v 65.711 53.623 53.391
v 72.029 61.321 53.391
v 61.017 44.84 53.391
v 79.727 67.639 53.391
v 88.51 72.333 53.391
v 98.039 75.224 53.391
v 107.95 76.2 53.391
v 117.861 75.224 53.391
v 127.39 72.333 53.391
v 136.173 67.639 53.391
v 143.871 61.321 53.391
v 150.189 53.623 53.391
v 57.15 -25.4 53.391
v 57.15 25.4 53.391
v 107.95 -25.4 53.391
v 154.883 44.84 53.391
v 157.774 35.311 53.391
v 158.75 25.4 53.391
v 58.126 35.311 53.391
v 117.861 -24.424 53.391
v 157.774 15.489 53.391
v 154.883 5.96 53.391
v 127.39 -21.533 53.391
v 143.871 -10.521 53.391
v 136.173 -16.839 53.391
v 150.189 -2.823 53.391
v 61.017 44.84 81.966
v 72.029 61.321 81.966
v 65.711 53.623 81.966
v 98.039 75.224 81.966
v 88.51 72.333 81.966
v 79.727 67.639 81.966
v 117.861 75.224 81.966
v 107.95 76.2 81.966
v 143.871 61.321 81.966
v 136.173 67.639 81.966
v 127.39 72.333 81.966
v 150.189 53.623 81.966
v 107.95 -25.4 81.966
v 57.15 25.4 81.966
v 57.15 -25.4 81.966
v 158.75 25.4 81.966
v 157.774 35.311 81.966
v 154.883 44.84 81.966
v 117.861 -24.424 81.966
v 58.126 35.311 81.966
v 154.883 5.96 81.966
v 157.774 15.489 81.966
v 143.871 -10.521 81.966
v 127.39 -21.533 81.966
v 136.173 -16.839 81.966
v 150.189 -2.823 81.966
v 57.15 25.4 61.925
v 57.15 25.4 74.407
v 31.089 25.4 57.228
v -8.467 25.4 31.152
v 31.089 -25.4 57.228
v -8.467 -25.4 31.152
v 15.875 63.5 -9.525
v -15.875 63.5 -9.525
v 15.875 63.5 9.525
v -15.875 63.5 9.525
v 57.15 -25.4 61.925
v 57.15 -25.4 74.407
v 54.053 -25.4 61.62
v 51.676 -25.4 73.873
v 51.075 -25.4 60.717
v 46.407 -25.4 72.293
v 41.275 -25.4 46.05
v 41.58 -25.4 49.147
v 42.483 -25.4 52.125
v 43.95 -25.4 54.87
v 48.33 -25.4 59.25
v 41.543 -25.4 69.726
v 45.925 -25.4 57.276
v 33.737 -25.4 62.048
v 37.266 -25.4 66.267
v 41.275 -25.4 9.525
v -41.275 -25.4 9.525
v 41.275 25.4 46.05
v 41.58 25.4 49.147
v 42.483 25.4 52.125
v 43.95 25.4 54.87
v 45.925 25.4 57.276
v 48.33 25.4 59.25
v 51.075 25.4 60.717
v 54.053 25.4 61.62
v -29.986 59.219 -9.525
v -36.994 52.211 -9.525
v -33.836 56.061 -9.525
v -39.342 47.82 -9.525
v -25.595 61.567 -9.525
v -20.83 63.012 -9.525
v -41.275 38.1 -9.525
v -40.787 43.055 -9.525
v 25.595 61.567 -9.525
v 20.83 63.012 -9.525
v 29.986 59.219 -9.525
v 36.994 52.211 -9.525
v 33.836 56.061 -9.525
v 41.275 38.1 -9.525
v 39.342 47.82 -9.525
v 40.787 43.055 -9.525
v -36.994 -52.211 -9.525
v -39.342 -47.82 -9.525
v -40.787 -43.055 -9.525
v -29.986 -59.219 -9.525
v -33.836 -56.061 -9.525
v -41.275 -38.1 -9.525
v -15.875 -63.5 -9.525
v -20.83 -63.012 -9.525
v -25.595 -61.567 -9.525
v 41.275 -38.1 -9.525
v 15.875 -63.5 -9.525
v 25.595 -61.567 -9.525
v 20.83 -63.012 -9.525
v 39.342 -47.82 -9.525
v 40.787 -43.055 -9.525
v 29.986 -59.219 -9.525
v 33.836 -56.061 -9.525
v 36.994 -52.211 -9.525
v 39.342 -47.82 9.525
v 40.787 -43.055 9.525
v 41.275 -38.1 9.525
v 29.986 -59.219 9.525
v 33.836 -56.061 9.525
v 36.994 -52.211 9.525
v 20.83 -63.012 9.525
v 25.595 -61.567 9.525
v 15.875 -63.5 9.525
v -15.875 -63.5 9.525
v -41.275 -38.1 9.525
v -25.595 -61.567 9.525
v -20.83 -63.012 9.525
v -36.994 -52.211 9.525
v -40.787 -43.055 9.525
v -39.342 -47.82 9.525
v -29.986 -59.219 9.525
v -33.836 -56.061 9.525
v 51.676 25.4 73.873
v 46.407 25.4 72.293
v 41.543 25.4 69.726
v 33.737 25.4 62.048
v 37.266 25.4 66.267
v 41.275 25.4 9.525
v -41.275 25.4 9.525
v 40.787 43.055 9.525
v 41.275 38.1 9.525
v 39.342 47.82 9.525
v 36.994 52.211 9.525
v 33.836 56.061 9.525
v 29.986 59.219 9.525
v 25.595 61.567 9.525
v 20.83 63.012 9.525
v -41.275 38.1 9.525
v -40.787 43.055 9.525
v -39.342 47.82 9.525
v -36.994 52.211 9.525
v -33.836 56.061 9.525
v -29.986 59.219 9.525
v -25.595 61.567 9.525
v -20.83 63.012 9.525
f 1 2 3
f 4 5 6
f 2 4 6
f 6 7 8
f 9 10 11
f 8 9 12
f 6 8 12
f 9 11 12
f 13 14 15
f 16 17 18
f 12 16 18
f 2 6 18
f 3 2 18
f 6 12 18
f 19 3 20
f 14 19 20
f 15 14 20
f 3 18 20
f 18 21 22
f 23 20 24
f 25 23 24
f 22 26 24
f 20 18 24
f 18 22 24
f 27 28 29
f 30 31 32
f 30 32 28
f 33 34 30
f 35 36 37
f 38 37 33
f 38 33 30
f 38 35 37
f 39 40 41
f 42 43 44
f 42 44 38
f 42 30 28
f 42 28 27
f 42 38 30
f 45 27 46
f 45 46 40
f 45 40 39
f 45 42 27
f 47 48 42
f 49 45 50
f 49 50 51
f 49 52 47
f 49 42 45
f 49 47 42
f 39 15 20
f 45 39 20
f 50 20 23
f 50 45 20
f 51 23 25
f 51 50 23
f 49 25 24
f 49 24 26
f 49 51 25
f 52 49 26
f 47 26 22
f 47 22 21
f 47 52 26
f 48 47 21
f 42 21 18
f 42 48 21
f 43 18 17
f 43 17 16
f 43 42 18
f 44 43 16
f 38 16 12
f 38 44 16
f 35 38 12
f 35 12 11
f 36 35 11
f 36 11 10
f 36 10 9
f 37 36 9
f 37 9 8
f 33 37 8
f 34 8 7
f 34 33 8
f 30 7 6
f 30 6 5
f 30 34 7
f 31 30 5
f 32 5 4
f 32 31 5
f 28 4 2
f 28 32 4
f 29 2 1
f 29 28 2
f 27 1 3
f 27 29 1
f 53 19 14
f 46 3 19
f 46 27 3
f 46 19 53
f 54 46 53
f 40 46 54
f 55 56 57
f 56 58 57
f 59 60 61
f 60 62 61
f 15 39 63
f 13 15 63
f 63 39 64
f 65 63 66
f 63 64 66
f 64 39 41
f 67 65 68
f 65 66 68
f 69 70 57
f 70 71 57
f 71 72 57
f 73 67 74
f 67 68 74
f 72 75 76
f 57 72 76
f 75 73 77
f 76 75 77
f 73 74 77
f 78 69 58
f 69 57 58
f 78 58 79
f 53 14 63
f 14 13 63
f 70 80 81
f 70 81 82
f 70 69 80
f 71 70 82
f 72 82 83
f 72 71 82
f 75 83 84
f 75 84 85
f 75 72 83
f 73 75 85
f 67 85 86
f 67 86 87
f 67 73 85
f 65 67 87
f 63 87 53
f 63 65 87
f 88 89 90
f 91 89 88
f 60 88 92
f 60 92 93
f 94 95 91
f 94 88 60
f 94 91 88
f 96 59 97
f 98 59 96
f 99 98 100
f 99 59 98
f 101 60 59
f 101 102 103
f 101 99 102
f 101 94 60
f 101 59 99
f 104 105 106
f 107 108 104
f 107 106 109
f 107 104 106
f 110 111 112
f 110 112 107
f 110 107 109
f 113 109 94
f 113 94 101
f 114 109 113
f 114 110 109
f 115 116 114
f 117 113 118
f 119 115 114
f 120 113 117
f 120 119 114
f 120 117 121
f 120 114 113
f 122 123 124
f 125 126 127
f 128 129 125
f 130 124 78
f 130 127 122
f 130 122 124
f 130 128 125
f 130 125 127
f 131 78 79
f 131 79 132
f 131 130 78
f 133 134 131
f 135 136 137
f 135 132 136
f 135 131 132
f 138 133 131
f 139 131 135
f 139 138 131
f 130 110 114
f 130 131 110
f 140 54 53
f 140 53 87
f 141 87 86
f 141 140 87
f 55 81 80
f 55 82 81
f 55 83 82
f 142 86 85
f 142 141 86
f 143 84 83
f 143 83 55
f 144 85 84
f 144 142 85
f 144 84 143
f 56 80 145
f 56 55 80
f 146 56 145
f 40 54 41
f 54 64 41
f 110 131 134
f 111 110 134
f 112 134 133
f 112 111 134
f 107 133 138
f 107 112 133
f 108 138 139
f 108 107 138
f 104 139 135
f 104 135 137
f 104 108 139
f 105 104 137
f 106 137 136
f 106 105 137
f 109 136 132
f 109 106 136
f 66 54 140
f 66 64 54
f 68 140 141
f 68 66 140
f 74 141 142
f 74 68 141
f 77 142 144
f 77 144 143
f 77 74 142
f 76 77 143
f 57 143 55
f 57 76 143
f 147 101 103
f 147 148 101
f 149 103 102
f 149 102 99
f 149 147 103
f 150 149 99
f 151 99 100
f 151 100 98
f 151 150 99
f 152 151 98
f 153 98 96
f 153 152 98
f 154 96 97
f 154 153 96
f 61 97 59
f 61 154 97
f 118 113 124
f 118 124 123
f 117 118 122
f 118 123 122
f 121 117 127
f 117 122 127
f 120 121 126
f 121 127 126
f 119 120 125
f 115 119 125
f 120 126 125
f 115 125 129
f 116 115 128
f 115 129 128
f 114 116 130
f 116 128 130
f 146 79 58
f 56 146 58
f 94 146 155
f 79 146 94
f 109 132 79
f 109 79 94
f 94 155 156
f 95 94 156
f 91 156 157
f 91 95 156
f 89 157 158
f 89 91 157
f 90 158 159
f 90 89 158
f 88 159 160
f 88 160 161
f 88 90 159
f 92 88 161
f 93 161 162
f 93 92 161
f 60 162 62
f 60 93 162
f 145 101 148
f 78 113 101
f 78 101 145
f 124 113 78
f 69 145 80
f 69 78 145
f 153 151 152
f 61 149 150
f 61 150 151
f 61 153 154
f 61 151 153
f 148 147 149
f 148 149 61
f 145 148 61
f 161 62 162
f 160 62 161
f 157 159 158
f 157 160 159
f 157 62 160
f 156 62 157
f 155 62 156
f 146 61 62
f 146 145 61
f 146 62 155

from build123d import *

# Parameters (mm, degrees)
F1_DEPTH  = 63.5
F0_W      = 15.1688941348
F0_H      = 12.481523478
F0_H_2    = 7.559076522
F0_H_3    = 8.5344
F2_DEPTH  = 25.4
F2_FACE_W = 50.8
F2_FACE_H = 28.575
F4_R      = 25.4
F5_R      = 25.4


with BuildPart() as f1:
    # F0 (on Front) → F1 (new body, symmetric)
    with BuildSketch(Plane.XZ):
        Polygon((28.793476522, 9.525), (-41.275, 9.525), (-41.275, -9.525), (41.275, -9.525), (41.275, 9.525), align=None)
    extrude(amount=F1_DEPTH, both=True)

    # F0 (on Front) → F2 (join, symmetric)
    with BuildSketch(Plane.XZ):
        with BuildLine():
            add(Edge.make_bspline(
                [(-41.275, 9.525), (-30.3388888889, 16.7340803864), (-19.4027777778, 23.9431607729), (-8.4666666667, 31.1522411593)],
                knots=[0, 0, 0, 0, 39.2953470054, 39.2953470054, 39.2953470054, 39.2953470054], degree=3))
            Line((-41.275, 9.525), (28.793476522, 9.525))
            Line((28.793476522, 9.525), (28.793476522, 46.0502))
            ThreePointArc((28.793476522, 46.0502), (29.3733625905, 51.7555341689), (31.0893036536, 57.2275221166))
            add(Edge.make_bspline(
                [(-8.4666666667, 31.1522411593), (4.7186567734, 39.8440014784), (17.9039802135, 48.5357617975), (31.0893036536, 57.2275221166)],
                knots=[39.2953470054, 39.2953470054, 39.2953470054, 39.2953470054, 86.6725046341, 86.6725046341, 86.6725046341, 86.6725046341], degree=3))
        make_face()
        Polygon((28.793476522, 9.525), (-41.275, 9.525), (-41.275, -9.525), (41.275, -9.525), (41.275, 9.525), align=None)
        with BuildLine():
            Line((28.793476522, 46.0502), (28.793476522, 9.525))
            Line((28.793476522, 9.525), (41.275, 9.525))
            Line((41.275, 9.525), (41.275, 46.0502))
            ThreePointArc((41.275, 46.0502), (45.9246798487, 57.2755201513), (57.15, 61.9252))
            Line((57.15, 61.9252), (57.15, 74.406723478))
            add(Edge.make_bspline(
                [(31.0893036536, 57.2275221166), (39.7762024357, 62.9539225704), (48.4631012179, 68.6803230242), (57.15, 74.406723478)],
                knots=[86.6725046341, 86.6725046341, 86.6725046341, 86.6725046341, 117.8860410162, 117.8860410162, 117.8860410162, 117.8860410162], degree=3))
            ThreePointArc((31.0893036536, 57.2275221166), (29.3733625905, 51.7555341689), (28.793476522, 46.0502))
        make_face()
        with BuildLine():
            ThreePointArc((57.15, 74.406723478), (41.543231809, 69.7255291506), (31.0893036536, 57.2275221166))
            add(Edge.make_bspline(
                [(31.0893036536, 57.2275221166), (39.7762024357, 62.9539225704), (48.4631012179, 68.6803230242), (57.15, 74.406723478)],
                knots=[86.6725046341, 86.6725046341, 86.6725046341, 86.6725046341, 117.8860410162, 117.8860410162, 117.8860410162, 117.8860410162], degree=3))
        make_face()
        with Locations((64.7344470674, 68.165961739)):
            Rectangle(F0_W, F0_H)
        with Locations((64.7344470674, 78.186261739)):
            Rectangle(F0_W, F0_H_2)
        with Locations((64.7344470674, 57.658)):
            Rectangle(F0_W, F0_H_3)
        Polygon((72.3188941348, 81.9658), (72.3188941348, 74.406723478), (72.3188941348, 61.9252), (72.3188941348, 53.3908), (107.95, 53.3908), (107.95, 81.9658), align=None)
    extrude(amount=F2_DEPTH, both=True)

    # F2_face (on face) → F3 (revolve)
    with BuildSketch(Plane(origin=(107.95, 0, 67.6783), x_dir=(0, 1, 0), z_dir=(1, 0, 0))):
        Rectangle(F2_FACE_W, F2_FACE_H)
    revolve(axis=Axis((107.95, 25.4, 67.6783), (0, 0, 1)))

    # F4
    f4_edges = [f1.edges().sort_by_distance(p)[0] for p in [
        (41.275, -63.5, 0),
        (-41.275, -63.5, 0),
    ]]
    fillet(f4_edges, radius=F4_R)

    # F5
    f5_edges = [f1.edges().sort_by_distance(p)[0] for p in [
        (-41.275, 63.5, 0),
        (41.275, 63.5, 0),
    ]]
    fillet(f5_edges, radius=F5_R)


solid = f1.part
